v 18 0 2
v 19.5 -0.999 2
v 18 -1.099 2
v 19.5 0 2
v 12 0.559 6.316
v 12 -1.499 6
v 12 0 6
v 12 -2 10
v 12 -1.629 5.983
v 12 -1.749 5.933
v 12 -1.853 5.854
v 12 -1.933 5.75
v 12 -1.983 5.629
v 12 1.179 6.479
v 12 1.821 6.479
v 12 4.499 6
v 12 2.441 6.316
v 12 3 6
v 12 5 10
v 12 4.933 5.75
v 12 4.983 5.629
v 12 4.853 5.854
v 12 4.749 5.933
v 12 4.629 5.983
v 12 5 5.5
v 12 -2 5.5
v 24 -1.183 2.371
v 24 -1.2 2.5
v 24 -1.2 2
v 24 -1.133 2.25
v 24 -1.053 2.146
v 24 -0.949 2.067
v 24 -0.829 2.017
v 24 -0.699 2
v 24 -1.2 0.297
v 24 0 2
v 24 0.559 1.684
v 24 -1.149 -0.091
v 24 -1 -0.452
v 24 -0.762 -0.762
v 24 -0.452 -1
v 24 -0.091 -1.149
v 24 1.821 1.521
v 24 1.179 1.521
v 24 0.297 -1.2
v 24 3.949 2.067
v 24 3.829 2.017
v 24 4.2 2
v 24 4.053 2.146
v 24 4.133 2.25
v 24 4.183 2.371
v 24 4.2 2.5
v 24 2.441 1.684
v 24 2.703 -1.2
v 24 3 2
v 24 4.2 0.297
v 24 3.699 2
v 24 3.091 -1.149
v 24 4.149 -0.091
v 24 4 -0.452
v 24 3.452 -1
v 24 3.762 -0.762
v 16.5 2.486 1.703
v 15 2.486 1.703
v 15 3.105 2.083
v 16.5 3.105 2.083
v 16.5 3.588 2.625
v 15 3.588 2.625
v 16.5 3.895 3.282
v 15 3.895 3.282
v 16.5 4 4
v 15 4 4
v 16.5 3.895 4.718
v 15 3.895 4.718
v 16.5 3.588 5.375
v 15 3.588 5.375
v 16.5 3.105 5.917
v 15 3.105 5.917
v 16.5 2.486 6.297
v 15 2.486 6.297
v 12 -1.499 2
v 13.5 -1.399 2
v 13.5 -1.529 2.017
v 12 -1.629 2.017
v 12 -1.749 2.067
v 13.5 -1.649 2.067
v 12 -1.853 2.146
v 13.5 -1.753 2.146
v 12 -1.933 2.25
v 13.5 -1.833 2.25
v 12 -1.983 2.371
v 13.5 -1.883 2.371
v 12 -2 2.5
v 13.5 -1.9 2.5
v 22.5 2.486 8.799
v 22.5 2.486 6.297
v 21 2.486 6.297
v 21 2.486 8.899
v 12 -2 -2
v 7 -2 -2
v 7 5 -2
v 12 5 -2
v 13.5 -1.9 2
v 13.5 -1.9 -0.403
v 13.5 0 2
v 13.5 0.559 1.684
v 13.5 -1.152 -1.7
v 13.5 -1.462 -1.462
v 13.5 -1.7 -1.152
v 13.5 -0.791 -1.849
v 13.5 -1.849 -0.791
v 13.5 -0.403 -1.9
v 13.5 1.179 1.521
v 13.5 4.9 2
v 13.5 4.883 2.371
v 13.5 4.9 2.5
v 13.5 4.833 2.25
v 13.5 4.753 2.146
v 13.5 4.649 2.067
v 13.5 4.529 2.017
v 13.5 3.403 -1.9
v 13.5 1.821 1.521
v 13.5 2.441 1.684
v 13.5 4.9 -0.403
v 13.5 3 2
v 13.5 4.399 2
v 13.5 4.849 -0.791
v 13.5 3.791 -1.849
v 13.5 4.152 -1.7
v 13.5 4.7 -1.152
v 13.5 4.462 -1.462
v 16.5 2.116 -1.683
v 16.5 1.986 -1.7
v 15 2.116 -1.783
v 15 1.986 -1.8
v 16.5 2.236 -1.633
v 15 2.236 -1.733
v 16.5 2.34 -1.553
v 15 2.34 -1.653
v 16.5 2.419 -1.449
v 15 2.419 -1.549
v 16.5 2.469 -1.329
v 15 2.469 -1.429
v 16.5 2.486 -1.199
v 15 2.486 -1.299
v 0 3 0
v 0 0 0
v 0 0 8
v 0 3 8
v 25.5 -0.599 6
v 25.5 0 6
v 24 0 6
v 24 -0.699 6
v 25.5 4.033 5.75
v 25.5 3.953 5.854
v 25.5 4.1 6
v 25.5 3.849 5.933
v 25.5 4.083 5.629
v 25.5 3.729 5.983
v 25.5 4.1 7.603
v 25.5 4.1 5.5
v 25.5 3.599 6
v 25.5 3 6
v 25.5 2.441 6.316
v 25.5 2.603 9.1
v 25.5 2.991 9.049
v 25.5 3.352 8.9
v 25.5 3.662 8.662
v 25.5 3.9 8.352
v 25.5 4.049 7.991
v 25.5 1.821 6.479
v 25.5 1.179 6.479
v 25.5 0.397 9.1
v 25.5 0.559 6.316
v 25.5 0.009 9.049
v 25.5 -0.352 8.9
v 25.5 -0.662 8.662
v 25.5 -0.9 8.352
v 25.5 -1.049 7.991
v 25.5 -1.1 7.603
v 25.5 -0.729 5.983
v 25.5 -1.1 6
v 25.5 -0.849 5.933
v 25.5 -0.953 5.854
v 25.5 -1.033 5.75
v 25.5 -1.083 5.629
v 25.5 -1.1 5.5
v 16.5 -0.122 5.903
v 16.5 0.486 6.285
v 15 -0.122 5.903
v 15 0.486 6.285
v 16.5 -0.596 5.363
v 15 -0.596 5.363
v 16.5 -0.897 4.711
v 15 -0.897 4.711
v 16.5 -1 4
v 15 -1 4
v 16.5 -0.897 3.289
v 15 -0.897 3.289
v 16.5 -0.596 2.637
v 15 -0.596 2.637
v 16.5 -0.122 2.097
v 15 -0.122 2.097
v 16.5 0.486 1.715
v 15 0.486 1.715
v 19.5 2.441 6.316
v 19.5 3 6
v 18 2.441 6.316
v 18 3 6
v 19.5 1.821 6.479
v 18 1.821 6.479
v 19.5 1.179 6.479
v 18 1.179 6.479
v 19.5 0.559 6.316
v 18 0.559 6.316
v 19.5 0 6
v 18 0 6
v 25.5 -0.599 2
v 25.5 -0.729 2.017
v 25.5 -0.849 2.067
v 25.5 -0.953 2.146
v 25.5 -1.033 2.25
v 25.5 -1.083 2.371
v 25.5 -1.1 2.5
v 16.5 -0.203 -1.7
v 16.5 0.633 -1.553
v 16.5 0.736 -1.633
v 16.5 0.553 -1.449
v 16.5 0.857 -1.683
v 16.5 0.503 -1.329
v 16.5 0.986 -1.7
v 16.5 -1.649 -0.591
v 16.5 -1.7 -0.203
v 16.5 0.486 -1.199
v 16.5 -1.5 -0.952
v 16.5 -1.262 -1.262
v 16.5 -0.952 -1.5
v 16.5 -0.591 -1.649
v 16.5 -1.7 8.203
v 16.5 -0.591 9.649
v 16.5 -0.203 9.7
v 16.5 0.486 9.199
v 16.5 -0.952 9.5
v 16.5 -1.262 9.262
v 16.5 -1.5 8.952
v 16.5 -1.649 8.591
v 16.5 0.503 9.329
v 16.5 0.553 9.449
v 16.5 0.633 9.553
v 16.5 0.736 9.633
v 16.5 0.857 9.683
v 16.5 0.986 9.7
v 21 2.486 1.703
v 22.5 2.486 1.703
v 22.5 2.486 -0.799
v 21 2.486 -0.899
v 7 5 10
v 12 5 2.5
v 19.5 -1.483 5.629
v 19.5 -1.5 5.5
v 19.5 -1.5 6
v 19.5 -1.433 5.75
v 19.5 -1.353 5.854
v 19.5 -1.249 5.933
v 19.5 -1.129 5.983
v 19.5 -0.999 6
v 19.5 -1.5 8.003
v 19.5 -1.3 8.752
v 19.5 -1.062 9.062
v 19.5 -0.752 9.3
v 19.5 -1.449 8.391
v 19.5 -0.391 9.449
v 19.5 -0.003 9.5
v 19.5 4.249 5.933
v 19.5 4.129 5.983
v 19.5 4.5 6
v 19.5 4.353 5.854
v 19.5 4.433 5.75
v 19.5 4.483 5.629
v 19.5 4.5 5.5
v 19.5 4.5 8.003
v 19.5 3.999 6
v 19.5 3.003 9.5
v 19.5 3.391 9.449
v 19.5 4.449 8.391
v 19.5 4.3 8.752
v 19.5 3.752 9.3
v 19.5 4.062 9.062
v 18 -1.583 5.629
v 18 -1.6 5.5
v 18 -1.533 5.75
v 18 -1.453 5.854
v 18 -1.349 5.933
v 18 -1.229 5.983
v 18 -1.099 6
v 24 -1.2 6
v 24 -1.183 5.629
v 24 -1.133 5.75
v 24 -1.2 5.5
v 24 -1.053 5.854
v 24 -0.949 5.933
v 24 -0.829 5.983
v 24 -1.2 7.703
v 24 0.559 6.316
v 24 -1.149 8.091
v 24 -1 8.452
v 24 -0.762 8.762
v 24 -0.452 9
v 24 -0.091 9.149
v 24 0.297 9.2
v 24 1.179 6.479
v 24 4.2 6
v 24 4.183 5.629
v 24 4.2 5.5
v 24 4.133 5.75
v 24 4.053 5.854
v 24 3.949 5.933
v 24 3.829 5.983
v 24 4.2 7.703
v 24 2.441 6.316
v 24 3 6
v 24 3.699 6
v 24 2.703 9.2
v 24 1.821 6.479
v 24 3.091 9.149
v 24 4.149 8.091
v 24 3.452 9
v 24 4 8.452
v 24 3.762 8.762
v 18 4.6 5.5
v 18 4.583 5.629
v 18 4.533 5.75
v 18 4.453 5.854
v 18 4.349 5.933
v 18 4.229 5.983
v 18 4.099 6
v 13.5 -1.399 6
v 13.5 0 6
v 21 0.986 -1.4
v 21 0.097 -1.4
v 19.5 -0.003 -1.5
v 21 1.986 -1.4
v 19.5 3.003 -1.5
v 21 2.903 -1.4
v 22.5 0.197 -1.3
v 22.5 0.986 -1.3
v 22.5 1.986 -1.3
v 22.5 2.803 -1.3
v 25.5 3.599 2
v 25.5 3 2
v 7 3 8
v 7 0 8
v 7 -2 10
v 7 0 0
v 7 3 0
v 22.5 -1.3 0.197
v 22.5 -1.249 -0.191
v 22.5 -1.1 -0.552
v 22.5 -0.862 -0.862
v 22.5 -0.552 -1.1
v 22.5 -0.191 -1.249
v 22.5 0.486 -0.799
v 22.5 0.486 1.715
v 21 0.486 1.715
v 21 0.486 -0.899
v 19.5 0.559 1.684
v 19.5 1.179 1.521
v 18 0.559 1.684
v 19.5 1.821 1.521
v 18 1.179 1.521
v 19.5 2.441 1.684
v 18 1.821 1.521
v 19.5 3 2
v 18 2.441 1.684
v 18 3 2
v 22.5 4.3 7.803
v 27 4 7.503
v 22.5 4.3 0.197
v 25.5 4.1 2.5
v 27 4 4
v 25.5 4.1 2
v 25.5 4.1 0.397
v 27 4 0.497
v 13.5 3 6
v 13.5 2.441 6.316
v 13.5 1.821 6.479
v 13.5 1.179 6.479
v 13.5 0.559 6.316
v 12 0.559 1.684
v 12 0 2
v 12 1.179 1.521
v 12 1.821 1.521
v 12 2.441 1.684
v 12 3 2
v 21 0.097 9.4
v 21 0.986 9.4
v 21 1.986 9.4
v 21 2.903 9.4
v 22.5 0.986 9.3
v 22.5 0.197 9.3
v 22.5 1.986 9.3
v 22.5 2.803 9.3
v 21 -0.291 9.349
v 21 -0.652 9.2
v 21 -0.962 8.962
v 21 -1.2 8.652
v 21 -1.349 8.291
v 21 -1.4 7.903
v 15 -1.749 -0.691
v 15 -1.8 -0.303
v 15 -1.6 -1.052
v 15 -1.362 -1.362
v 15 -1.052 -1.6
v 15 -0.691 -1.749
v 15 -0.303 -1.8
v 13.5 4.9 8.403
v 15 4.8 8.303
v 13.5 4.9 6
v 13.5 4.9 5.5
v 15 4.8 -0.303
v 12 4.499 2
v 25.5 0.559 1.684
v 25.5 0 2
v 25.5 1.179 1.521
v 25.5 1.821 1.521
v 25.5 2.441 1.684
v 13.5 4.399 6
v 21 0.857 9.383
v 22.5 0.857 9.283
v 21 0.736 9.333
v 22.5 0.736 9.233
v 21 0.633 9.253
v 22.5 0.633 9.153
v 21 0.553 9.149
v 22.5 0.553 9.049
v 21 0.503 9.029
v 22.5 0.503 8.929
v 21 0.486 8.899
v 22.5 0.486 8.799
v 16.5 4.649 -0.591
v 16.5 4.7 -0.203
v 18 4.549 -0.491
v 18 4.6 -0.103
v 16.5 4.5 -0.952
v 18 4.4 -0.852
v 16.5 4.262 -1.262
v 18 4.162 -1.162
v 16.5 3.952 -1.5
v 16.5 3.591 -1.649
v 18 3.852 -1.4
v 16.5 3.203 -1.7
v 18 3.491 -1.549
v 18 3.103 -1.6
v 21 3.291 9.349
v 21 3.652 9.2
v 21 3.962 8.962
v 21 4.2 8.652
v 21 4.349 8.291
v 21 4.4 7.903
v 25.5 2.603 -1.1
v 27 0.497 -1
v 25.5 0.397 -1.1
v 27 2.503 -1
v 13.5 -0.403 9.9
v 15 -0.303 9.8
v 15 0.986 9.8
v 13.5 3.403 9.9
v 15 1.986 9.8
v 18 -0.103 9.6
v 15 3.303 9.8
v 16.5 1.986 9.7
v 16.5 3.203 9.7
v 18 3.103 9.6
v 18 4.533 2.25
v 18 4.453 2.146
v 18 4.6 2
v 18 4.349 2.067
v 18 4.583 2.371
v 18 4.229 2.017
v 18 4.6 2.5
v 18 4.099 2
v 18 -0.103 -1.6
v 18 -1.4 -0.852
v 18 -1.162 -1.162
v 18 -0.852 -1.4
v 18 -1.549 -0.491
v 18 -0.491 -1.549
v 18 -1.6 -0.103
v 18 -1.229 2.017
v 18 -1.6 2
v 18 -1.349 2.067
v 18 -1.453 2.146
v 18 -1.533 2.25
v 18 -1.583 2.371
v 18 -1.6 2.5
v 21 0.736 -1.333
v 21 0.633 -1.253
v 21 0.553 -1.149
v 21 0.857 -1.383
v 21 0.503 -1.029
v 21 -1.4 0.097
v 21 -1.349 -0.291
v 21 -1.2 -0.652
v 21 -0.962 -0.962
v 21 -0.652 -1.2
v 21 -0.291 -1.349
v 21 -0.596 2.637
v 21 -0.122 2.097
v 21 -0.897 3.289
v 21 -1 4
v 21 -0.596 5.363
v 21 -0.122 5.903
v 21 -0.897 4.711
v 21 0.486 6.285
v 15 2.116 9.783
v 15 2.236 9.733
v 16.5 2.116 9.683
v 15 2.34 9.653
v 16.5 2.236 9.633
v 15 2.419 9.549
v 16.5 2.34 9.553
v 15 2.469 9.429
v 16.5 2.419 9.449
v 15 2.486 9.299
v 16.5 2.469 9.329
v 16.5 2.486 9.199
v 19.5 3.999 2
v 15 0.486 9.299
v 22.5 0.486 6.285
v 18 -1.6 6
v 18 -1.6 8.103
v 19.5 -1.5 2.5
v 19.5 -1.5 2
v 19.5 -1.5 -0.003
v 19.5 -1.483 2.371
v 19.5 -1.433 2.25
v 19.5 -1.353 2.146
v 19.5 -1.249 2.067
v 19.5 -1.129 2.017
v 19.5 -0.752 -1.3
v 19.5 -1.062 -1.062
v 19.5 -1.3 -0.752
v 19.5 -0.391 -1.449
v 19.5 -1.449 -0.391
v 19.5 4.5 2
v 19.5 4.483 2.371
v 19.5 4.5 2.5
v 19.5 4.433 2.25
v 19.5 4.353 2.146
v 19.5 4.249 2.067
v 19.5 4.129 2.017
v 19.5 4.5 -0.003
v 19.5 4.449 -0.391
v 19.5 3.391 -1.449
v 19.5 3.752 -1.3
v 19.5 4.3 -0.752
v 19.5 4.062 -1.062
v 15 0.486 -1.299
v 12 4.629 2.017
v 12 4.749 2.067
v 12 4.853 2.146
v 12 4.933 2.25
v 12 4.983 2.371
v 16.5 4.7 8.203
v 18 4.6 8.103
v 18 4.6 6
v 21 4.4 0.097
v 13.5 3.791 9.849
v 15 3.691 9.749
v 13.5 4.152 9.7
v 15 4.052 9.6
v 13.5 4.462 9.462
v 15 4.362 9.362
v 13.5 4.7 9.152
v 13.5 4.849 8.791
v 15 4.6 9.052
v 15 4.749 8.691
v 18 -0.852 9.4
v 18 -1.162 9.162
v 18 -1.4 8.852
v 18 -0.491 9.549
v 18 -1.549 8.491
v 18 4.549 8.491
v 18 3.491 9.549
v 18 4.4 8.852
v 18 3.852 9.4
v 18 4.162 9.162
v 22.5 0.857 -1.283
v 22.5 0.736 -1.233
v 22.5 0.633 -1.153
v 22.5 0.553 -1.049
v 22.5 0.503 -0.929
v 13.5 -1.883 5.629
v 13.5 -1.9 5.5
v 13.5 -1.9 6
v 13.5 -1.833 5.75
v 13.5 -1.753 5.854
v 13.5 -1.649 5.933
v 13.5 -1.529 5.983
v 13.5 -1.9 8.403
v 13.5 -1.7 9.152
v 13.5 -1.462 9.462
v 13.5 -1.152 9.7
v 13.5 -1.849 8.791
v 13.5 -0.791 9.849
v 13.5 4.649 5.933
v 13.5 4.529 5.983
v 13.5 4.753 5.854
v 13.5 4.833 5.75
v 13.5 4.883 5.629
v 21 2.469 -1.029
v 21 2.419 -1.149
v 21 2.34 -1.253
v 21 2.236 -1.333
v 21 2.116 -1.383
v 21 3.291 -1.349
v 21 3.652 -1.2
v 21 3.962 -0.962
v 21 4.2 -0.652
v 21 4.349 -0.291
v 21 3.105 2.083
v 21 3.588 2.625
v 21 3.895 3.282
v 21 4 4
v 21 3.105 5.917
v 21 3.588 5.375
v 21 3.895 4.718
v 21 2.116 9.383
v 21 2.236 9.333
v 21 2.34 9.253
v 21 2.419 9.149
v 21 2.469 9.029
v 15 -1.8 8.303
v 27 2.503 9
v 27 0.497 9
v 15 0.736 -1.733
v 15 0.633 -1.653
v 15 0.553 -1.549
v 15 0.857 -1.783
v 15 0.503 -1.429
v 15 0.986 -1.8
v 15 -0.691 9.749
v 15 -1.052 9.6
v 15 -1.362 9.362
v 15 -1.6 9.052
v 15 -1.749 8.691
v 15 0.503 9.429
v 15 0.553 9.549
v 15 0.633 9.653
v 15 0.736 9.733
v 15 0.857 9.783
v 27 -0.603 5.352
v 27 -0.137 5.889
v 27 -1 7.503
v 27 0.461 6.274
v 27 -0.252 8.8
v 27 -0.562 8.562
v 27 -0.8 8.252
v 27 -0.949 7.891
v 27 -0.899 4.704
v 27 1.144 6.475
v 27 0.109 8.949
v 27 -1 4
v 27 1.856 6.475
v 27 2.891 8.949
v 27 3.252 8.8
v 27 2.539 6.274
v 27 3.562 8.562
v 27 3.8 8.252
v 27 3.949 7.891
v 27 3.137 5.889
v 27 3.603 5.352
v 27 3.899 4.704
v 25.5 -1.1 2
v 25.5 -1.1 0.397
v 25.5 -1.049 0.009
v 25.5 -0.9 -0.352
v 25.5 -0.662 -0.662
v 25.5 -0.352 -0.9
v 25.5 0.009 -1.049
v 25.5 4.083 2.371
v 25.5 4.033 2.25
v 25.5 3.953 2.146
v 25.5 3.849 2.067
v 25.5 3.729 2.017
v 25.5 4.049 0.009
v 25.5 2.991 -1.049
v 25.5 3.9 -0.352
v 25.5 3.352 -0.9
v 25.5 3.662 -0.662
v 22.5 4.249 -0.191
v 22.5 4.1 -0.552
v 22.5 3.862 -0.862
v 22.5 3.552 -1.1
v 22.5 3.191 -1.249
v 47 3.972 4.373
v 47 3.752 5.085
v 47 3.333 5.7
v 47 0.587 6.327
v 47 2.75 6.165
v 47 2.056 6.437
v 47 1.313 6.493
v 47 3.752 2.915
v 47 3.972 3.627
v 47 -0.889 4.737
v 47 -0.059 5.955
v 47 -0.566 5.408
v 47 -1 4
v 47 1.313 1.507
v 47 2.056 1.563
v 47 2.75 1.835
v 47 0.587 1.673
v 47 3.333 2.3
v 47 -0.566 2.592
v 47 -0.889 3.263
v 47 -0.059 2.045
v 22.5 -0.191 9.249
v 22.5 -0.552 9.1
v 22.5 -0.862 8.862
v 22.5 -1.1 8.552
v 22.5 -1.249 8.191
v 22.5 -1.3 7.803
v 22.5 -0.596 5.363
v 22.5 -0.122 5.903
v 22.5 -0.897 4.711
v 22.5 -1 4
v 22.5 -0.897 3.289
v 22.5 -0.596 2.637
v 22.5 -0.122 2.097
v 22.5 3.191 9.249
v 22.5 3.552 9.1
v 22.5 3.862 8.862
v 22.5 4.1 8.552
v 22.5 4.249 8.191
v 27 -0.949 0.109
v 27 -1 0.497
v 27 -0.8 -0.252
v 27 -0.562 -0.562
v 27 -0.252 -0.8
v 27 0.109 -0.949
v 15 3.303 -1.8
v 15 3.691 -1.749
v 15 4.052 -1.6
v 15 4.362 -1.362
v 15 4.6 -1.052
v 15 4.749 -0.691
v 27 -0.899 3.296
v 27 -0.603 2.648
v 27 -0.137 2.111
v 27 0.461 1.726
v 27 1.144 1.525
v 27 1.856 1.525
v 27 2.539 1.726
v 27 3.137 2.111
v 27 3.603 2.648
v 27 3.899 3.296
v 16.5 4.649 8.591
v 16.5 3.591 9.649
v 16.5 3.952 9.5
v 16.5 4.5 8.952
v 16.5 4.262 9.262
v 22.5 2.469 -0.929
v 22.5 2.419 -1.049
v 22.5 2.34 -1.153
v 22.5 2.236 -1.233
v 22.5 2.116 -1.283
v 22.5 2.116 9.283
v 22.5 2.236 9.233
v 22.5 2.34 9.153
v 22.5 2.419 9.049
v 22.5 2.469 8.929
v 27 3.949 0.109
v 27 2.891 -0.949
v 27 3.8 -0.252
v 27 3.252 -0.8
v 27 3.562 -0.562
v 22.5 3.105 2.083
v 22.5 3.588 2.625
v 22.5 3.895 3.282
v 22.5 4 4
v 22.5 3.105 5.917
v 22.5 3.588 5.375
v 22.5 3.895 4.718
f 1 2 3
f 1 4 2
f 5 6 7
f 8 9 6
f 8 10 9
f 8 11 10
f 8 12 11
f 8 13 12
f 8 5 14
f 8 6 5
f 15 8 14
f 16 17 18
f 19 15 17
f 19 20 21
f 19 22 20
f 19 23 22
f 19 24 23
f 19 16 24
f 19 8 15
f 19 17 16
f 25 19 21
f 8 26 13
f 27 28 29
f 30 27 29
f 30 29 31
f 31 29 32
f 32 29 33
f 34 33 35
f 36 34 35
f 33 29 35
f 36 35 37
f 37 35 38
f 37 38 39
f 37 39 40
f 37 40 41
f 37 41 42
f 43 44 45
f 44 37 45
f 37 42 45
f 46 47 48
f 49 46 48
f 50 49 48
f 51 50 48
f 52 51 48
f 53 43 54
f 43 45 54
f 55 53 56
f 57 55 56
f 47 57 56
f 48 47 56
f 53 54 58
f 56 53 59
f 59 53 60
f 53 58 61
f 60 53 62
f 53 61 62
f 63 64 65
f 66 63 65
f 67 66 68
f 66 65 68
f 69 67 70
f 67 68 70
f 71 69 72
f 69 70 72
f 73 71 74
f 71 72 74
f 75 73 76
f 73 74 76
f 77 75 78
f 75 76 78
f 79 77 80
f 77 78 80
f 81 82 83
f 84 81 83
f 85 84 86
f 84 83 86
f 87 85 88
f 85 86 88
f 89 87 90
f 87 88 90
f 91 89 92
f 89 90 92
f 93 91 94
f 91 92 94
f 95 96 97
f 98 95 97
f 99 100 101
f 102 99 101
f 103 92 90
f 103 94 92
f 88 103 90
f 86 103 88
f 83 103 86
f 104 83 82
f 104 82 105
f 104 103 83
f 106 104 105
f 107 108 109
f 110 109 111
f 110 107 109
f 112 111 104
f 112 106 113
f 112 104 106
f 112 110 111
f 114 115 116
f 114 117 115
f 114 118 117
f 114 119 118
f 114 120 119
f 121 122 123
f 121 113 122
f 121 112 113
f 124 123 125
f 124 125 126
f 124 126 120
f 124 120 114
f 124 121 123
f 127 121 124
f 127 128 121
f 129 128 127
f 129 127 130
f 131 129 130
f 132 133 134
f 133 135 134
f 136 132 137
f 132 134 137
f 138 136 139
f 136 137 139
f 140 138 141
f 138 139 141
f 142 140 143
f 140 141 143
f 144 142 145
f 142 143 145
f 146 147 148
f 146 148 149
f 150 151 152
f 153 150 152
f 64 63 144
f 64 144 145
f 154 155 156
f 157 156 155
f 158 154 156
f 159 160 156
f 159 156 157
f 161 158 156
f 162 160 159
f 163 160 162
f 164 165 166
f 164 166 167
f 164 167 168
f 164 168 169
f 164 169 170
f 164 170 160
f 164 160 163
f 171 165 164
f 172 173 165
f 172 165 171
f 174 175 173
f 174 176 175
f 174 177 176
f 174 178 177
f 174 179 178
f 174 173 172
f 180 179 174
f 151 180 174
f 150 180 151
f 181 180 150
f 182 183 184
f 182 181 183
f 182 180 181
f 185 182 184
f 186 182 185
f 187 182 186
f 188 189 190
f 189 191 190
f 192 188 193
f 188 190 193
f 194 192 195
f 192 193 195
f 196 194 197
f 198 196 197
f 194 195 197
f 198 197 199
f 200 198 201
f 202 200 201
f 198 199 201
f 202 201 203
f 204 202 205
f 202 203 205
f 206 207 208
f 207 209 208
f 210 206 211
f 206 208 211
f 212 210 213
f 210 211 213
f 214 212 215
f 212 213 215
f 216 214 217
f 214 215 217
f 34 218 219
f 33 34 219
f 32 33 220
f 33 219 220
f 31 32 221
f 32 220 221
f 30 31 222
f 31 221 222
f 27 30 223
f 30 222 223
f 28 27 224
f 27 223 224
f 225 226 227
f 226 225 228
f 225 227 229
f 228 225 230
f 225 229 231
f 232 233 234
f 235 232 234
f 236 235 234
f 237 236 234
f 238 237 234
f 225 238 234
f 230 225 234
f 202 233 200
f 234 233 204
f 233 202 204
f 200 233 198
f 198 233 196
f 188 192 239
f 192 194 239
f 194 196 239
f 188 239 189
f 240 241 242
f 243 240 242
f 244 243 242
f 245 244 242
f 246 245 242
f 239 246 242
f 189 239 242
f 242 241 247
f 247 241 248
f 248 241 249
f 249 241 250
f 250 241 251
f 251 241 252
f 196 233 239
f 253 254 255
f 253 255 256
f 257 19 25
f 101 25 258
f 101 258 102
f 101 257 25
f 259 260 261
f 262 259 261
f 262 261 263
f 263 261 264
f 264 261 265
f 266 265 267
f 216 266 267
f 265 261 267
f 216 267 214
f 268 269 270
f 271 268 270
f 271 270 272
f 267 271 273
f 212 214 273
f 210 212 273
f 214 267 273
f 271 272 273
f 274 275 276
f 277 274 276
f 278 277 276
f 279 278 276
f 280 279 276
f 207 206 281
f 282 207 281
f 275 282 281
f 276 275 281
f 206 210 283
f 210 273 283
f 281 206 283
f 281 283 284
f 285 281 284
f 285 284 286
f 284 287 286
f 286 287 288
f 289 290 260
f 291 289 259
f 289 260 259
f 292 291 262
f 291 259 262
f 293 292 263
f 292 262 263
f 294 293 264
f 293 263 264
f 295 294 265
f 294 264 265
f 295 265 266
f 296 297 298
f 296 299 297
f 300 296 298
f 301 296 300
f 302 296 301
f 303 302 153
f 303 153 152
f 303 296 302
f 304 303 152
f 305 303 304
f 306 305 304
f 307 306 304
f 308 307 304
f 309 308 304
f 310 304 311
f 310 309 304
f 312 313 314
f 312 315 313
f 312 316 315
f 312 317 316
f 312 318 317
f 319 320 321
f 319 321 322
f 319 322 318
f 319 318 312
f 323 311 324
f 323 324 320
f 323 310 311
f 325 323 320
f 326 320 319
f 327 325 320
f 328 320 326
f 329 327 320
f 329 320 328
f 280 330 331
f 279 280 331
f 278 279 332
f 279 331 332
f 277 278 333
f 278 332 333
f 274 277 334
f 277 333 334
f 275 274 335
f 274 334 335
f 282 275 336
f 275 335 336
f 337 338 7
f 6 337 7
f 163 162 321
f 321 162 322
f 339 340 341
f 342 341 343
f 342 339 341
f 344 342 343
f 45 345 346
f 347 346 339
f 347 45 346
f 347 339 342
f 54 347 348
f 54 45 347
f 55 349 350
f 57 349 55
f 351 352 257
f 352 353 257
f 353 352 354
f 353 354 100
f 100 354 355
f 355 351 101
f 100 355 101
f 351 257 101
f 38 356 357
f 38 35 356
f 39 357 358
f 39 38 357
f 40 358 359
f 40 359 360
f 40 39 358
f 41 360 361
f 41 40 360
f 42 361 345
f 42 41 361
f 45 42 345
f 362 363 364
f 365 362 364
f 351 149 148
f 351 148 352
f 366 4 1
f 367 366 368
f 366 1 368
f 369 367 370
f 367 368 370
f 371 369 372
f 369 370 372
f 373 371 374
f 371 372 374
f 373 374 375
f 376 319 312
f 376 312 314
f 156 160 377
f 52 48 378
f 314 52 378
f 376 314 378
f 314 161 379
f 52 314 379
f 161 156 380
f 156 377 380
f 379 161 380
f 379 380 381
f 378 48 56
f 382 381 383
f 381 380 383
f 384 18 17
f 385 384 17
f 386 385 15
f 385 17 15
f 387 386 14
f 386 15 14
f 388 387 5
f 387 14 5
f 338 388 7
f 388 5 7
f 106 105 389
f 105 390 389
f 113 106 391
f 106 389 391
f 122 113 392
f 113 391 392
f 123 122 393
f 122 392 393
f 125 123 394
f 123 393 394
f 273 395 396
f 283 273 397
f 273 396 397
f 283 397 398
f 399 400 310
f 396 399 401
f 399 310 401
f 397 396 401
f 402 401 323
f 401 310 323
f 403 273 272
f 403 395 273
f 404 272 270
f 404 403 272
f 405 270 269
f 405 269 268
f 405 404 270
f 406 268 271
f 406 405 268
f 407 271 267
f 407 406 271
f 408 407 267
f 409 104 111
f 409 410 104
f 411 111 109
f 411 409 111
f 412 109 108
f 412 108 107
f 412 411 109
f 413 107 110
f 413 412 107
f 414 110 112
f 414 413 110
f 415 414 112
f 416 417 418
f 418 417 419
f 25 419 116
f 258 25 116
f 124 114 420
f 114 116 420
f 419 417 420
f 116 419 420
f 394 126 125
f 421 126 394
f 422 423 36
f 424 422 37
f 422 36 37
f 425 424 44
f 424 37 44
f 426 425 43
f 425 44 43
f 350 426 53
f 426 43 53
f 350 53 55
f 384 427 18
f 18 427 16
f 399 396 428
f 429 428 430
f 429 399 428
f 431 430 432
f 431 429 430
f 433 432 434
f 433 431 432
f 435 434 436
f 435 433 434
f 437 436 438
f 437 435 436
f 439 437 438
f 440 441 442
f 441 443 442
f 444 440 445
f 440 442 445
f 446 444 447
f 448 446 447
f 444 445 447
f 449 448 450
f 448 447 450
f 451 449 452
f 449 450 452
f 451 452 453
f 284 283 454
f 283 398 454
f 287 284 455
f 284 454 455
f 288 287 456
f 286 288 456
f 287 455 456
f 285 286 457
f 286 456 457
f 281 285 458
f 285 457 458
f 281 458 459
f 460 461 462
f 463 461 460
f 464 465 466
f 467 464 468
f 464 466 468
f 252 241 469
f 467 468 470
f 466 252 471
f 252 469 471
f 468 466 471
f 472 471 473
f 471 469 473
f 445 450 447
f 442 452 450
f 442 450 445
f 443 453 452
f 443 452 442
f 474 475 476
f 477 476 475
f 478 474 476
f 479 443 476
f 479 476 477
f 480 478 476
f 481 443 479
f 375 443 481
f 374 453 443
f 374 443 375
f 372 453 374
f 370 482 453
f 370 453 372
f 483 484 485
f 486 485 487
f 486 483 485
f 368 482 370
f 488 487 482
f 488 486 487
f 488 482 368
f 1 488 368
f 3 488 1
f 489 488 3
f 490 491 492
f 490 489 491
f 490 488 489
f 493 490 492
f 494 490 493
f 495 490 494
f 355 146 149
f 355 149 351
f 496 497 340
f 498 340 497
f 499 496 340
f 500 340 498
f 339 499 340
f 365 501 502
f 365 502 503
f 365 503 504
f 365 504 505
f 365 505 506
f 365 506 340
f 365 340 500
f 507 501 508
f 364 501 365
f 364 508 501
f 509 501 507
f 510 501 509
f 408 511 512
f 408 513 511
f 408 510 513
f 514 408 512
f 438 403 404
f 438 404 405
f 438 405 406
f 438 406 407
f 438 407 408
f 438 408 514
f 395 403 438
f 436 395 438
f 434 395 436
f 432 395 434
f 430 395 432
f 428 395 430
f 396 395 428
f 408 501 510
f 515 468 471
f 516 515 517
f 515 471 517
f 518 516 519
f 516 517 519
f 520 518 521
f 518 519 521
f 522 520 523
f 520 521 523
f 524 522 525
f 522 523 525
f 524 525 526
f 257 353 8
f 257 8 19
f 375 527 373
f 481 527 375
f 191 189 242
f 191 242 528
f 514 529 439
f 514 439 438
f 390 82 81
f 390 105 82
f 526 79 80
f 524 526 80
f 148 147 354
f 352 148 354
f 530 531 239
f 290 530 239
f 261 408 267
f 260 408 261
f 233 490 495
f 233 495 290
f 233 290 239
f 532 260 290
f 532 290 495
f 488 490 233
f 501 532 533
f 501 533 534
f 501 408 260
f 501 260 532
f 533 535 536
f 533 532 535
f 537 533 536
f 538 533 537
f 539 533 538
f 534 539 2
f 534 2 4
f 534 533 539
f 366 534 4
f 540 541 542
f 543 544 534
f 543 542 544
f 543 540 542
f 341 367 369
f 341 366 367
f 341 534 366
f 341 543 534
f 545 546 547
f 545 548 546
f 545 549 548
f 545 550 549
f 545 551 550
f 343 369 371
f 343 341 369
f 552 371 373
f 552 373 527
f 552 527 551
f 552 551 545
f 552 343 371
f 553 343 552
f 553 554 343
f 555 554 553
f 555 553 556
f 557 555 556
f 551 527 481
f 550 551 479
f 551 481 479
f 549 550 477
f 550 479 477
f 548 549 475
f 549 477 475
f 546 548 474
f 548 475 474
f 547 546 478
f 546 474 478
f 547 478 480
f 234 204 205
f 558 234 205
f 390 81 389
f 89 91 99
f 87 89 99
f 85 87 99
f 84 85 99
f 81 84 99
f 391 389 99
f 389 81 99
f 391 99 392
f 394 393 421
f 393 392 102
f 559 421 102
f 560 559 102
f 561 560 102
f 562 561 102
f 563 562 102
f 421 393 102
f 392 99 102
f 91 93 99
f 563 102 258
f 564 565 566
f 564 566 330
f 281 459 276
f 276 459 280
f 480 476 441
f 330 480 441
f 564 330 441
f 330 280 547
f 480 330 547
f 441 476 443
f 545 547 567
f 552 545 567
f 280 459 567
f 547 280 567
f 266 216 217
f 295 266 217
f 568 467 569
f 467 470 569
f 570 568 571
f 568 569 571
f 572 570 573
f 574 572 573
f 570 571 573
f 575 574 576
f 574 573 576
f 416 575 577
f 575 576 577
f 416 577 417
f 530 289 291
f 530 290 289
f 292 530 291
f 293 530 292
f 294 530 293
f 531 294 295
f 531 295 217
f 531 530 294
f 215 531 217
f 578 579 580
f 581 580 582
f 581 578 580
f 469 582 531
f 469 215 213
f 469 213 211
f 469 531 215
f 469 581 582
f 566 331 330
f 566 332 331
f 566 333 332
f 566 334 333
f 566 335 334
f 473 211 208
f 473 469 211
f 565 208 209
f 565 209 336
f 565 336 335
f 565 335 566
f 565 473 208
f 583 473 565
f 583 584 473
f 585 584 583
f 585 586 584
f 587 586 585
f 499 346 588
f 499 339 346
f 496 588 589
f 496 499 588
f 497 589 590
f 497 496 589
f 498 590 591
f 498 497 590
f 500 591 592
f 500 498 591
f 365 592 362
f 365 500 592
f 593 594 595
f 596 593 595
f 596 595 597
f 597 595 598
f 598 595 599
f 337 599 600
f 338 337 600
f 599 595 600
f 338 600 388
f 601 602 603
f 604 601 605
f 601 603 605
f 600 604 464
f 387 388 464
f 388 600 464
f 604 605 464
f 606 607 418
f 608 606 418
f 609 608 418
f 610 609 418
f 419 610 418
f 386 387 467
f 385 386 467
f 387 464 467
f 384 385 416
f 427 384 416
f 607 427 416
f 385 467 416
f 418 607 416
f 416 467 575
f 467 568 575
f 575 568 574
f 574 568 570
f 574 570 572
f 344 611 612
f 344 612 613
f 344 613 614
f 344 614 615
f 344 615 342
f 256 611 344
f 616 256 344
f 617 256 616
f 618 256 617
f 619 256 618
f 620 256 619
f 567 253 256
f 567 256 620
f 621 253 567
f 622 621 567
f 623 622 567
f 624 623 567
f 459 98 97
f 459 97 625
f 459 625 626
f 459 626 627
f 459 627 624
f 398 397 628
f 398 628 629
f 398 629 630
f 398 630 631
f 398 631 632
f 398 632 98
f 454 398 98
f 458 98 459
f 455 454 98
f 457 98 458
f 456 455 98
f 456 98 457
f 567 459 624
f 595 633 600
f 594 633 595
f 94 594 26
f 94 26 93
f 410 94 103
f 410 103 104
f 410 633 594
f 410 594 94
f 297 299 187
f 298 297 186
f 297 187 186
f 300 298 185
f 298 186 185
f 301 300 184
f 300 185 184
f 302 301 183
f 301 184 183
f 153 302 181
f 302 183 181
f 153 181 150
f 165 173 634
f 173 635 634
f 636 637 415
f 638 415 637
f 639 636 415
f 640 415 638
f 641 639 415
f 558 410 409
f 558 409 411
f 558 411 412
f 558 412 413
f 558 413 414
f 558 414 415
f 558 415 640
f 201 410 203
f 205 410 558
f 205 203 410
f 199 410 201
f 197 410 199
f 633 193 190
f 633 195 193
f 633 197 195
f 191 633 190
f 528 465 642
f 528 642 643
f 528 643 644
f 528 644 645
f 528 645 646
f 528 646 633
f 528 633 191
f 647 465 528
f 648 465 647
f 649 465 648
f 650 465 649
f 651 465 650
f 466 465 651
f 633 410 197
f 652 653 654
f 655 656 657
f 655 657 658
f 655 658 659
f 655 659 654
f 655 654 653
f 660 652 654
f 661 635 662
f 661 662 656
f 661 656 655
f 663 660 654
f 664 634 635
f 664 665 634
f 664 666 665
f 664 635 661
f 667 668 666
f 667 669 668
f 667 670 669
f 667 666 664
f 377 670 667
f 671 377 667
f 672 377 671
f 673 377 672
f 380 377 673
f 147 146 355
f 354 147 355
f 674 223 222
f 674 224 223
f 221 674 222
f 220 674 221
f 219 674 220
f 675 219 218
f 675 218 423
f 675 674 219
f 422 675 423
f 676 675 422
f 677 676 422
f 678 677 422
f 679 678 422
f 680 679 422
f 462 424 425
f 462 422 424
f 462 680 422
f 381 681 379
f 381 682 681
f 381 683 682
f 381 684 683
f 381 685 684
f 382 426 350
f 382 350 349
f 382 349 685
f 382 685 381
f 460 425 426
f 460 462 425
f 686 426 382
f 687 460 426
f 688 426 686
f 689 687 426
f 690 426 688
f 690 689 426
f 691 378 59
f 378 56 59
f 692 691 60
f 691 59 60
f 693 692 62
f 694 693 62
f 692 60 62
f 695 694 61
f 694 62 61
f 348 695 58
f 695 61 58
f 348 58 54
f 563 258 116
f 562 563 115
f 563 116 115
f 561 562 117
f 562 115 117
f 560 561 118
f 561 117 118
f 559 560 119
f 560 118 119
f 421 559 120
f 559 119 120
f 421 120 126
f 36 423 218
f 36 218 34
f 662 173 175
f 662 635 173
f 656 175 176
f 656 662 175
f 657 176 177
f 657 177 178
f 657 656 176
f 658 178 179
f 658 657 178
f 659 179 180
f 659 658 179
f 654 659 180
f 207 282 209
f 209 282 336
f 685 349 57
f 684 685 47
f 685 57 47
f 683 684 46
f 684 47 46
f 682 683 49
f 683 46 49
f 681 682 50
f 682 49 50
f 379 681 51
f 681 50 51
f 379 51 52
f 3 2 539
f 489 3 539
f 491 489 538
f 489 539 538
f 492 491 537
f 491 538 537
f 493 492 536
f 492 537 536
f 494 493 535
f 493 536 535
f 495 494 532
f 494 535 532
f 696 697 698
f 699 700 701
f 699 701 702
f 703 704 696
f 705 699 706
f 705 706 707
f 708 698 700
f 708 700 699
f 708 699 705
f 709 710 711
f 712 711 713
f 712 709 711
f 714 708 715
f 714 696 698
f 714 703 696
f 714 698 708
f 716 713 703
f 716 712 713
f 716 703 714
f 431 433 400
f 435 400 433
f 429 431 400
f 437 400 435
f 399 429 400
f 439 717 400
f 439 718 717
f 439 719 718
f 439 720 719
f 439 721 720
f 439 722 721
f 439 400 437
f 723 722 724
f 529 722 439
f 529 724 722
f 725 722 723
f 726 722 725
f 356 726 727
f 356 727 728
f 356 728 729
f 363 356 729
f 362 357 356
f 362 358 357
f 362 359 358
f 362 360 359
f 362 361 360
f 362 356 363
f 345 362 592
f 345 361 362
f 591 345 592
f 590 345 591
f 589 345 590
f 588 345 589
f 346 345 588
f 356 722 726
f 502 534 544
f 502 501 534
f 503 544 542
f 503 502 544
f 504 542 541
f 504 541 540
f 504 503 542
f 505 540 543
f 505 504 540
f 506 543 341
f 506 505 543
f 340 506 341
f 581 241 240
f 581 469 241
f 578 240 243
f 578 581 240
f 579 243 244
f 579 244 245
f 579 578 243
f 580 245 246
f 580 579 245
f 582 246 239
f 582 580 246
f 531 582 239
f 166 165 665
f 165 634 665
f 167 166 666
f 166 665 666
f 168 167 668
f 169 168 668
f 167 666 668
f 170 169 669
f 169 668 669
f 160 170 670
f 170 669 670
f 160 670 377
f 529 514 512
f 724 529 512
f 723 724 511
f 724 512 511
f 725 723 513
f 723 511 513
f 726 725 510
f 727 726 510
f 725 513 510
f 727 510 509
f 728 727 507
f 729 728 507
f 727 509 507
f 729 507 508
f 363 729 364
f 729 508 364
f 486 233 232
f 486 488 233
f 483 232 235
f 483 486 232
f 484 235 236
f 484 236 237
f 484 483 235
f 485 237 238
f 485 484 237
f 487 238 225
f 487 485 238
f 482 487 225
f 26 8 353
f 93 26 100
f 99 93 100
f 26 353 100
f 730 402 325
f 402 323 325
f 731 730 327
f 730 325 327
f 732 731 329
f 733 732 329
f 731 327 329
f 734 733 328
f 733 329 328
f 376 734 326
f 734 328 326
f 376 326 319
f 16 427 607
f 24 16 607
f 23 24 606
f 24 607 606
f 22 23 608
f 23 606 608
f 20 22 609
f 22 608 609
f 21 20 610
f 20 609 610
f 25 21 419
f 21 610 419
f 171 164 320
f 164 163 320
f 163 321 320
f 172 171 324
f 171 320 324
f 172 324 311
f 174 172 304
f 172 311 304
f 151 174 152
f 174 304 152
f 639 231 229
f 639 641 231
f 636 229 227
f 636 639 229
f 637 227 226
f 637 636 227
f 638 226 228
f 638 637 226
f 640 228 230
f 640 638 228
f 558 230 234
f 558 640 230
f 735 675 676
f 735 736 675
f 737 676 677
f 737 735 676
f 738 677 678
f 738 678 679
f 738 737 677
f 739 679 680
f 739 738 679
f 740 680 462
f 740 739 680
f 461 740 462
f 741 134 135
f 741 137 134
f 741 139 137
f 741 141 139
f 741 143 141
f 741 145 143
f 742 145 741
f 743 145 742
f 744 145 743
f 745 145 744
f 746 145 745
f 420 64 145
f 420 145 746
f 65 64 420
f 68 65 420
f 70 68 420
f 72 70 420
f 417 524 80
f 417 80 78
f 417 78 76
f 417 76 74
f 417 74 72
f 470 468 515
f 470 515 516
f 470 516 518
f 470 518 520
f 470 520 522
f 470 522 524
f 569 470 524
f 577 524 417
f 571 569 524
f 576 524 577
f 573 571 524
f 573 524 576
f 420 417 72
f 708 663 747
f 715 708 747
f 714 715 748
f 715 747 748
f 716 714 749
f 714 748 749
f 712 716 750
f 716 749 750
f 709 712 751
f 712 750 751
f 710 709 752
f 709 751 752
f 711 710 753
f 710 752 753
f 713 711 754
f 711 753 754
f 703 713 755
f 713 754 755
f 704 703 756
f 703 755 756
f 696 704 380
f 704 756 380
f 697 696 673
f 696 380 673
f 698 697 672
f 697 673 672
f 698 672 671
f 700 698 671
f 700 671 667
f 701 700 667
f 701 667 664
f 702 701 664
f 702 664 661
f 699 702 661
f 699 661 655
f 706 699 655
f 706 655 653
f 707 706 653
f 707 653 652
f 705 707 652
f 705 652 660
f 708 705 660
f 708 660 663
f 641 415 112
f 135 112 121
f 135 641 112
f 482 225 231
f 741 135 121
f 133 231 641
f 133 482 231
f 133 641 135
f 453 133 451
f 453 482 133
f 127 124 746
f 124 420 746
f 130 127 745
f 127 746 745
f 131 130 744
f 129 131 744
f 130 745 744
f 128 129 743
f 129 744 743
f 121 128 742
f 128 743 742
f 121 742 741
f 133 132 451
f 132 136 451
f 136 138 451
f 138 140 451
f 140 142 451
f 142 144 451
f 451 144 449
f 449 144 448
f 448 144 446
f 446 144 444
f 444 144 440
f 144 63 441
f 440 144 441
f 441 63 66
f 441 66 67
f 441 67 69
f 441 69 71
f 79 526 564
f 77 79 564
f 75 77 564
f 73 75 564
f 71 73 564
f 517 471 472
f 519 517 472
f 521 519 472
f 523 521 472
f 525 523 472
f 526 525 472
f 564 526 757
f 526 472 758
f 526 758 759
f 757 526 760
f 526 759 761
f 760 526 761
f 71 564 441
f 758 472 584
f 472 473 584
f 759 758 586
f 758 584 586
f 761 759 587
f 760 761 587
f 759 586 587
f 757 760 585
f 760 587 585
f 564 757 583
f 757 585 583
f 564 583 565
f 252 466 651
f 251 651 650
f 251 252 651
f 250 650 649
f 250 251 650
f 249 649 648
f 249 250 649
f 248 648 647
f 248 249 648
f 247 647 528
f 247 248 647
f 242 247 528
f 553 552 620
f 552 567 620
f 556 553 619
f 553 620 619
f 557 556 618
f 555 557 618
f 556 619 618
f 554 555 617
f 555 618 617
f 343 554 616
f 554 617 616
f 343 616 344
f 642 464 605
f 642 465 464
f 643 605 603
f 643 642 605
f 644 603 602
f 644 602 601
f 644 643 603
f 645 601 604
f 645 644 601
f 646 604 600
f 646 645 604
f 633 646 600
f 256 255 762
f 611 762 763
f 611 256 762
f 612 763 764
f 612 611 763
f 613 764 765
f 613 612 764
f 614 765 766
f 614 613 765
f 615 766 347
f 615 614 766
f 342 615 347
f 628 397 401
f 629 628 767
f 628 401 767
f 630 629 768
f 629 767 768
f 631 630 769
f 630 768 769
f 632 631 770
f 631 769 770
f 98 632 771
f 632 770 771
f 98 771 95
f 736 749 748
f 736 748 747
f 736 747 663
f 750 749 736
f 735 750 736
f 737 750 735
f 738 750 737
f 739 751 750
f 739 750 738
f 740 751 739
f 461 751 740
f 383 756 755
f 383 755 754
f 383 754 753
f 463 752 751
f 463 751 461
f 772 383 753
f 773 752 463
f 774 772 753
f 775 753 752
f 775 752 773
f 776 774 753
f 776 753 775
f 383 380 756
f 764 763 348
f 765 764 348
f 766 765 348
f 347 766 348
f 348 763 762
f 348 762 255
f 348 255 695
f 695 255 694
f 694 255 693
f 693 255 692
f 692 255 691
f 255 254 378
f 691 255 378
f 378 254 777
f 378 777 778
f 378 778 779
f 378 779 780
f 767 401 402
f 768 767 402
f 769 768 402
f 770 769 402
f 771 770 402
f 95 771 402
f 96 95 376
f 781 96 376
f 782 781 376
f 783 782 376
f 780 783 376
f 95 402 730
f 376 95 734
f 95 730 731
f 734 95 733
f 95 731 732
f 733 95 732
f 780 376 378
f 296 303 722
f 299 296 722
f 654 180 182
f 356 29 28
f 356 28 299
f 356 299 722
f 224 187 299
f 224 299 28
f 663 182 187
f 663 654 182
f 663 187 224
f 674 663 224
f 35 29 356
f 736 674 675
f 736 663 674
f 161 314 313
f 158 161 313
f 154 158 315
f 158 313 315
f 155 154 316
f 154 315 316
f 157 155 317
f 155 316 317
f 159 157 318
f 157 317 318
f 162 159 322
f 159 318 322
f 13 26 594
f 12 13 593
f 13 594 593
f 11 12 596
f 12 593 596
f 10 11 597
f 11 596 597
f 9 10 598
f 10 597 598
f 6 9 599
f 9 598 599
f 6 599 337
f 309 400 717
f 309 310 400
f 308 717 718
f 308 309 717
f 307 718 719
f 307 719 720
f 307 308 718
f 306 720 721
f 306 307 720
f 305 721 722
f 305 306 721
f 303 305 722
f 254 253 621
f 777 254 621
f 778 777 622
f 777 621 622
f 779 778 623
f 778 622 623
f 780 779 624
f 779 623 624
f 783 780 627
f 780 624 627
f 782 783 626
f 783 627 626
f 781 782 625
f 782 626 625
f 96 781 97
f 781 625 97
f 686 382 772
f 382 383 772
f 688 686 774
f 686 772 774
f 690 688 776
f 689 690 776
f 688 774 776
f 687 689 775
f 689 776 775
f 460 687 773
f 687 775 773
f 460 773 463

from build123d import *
from OCP.BRepFilletAPI import BRepFilletAPI_MakeChamfer

# Parameters (mm, degrees)
SKETCH_1_W           = 7
SKETCH_1_H           = 3
EXTRUDE_1_DEPTH      = 8
SKETCH_2_W           = 12
SKETCH_2_H           = 7
EXTRUDE_2_DEPTH      = 20
CHAMFER_1_SIZE       = 15
CHAMFER_1_SIZE2      = 1
SKETCH_4_W           = 1.5
SKETCH_4_H           = 2.5
SKETCH_4_H_2         = 2.51354888
SKETCH_4_H_3         = 2.48645112
CUT_EXTRUDE_1_DEPTH  = 4
FILLET_1_R           = 1.5
SKETCH_9_W           = 1.5
SKETCH_9_H           = 2
CUT_EXTRUDE_3_DEPTH  = 4
SKETCH_10_W          = 1.5
SKETCH_10_H          = 4
CUT_EXTRUDE_4_DEPTH  = 2.5
EXTRUDE_3_DEPTH      = 20
EXTRUDE_3_DEPTH_BACK = 20
SKETCH_11_R          = 2.5
FILLET_2_R           = 0.5
FILLET_3_R           = 0.5
FILLET_4_R           = 0.5
FILLET_5_R           = 0.5


with BuildPart() as part:
    # Эскиз1 → Бобышка-Вытянуть1 (new body)
    with BuildSketch(Plane.XY):
        with Locations((3.5, 1.5)):
            Rectangle(SKETCH_1_W, SKETCH_1_H)
    extrude(amount=EXTRUDE_1_DEPTH)

    # Эскиз2 → Бобышка-Вытянуть2 (add)
    with BuildSketch(Plane(origin=(7, 0, 0), x_dir=(0, 0, -1), z_dir=(1, 0, 0))):
        with Locations((-4, 1.5)):
            Rectangle(SKETCH_2_W, SKETCH_2_H)
    extrude(amount=EXTRUDE_2_DEPTH)

    # Фаска1: one chamfer whose edges measure the first distance from different faces: ONE call of the kernel's chamfer builder (chamfer() names one face for all edges)
    chamfer_1_edges_1 = [part.edges().sort_by_distance(p)[0] for p in [
        (27, 1.5, 10),
    ]]
    chamfer_1_side_1 = [part.faces().sort_by_distance(p)[0] for p in [
        (17, 1.5, 10),
    ]]
    chamfer_1_edges_2 = [part.edges().sort_by_distance(p)[0] for p in [
        (27, -2, 4),
    ]]
    chamfer_1_side_2 = [part.faces().sort_by_distance(p)[0] for p in [
        (17, -2, 4),
    ]]
    chamfer_1_edges_3 = [part.edges().sort_by_distance(p)[0] for p in [
        (27, 1.5, -2),
    ]]
    chamfer_1_side_3 = [part.faces().sort_by_distance(p)[0] for p in [
        (17, 1.5, -2),
    ]]
    chamfer_1_edges_4 = [part.edges().sort_by_distance(p)[0] for p in [
        (27, 5, 4),
    ]]
    chamfer_1_side_4 = [part.faces().sort_by_distance(p)[0] for p in [
        (17, 5, 4),
    ]]
    chamfer_1 = BRepFilletAPI_MakeChamfer(part.part.solid().wrapped)
    for e in chamfer_1_edges_1:
        chamfer_1.Add(CHAMFER_1_SIZE, CHAMFER_1_SIZE2, e.wrapped, chamfer_1_side_1[0].wrapped)  # the first distance lies on this face
    for e in chamfer_1_edges_2:
        chamfer_1.Add(CHAMFER_1_SIZE, CHAMFER_1_SIZE2, e.wrapped, chamfer_1_side_2[0].wrapped)  # the first distance lies on this face
    for e in chamfer_1_edges_3:
        chamfer_1.Add(CHAMFER_1_SIZE, CHAMFER_1_SIZE2, e.wrapped, chamfer_1_side_3[0].wrapped)  # the first distance lies on this face
    for e in chamfer_1_edges_4:
        chamfer_1.Add(CHAMFER_1_SIZE, CHAMFER_1_SIZE2, e.wrapped, chamfer_1_side_4[0].wrapped)  # the first distance lies on this face
    add(Compound.cast(chamfer_1.Shape()), mode=Mode.REPLACE)

    # Эскиз4 → Вырез-Вытянуть1 (cut)
    with BuildSketch(Plane(origin=(0, 0, -2), x_dir=(-1, 0, 0), z_dir=(0, 0, -1))):
        with Locations((-24.75, 3.73645112)):
            Rectangle(SKETCH_4_W, SKETCH_4_H)
        with Locations((-21.75, 3.73645112)):
            Rectangle(SKETCH_4_W, SKETCH_4_H)
        with Locations((-18.75, 3.73645112)):
            Rectangle(SKETCH_4_W, SKETCH_4_H)
        with Locations((-15.75, 3.73645112)):
            Rectangle(SKETCH_4_W, SKETCH_4_H)
        with Locations((-12.75, 3.74322556)):
            Rectangle(SKETCH_4_W, SKETCH_4_H_2)
        with Locations((-21.75, -0.76354888)):
            Rectangle(SKETCH_4_W, SKETCH_4_H)
        with Locations((-18.75, -0.76354888)):
            Rectangle(SKETCH_4_W, SKETCH_4_H)
        with Locations((-15.75, -0.76354888)):
            Rectangle(SKETCH_4_W, SKETCH_4_H)
        with Locations((-12.75, -0.75677444)):
            Rectangle(SKETCH_4_W, SKETCH_4_H_3)
        with Locations((-24.75, -0.76354888)):
            Rectangle(SKETCH_4_W, SKETCH_4_H)
    cut_extrude_1 = extrude(amount=-CUT_EXTRUDE_1_DEPTH, mode=Mode.SUBTRACT)

    # Зеркальное отражение1: Вырез-Вытянуть1 across plane
    add(cut_extrude_1.mirror(Plane.XY.offset(4)), mode=Mode.SUBTRACT)

    # Скругление1
    fillet_1_edges = [part.edges().sort_by_distance(p)[0] for p in [
        (20.25, -1.45, -1.45),
        (17.25, -1.65, -1.65),
        (14.25, -1.85, -1.85),
        (23.25, -1.25, -1.25),
        (26.25, 4.05, 9.05),
        (23.25, 4.25, 9.25),
        (20.25, 4.45, 9.45),
        (17.25, 4.65, 9.65),
        (14.25, 4.85, 9.85),
        (23.25, -1.25, 9.25),
        (20.25, -1.45, 9.45),
        (17.25, -1.65, 9.65),
        (26.25, -1.05, -1.05),
        (14.25, -1.85, 9.85),
        (26.25, 4.05, -1.05),
        (26.25, -1.05, 9.05),
        (23.25, 4.25, -1.25),
        (20.25, 4.45, -1.45),
        (17.25, 4.65, -1.65),
        (14.25, 4.85, -1.85),
    ]]
    fillet(fillet_1_edges, radius=FILLET_1_R)

    # Эскиз9 → Вырез-Вытянуть3 (cut)
    with BuildSketch(Plane.XY.offset(10)):
        with Locations((12.75, 1.48645112)):
            Rectangle(SKETCH_9_W, SKETCH_9_H)
        with Locations((18.75, 1.48645112)):
            Rectangle(SKETCH_9_W, SKETCH_9_H)
        with Locations((24.75, 1.48645112)):
            Rectangle(SKETCH_9_W, SKETCH_9_H)
    cut_extrude_3 = extrude(amount=-CUT_EXTRUDE_3_DEPTH, mode=Mode.SUBTRACT)

    # Зеркальное отражение2: Вырез-Вытянуть3 across plane
    add(cut_extrude_3.mirror(Plane.XY.offset(4)), mode=Mode.SUBTRACT)

    # Эскиз10 → Вырез-Вытянуть4 (cut)
    with BuildSketch(Plane(origin=(0, 5, 0), x_dir=(1, 0, 0), z_dir=(0, 1, 0))):
        with Locations((15.75, -4)):
            Rectangle(SKETCH_10_W, SKETCH_10_H)
        with Locations((21.75, -4)):
            Rectangle(SKETCH_10_W, SKETCH_10_H)
    cut_extrude_4 = extrude(amount=-CUT_EXTRUDE_4_DEPTH, mode=Mode.SUBTRACT)

    # Зеркальное отражение3: Вырез-Вытянуть4 across plane
    add(cut_extrude_4.mirror(Plane.ZX.offset(1.5)), mode=Mode.SUBTRACT)

    # Эскиз11 → Бобышка-Вытянуть3 (add, two sides: drawn at the far end of the back side and taken through both)
    with BuildSketch(Plane(origin=(27, 0, 0), x_dir=(0, 0, -1), z_dir=(1, 0, 0)).offset(-EXTRUDE_3_DEPTH_BACK)):
        with Locations(Location((-4, 1.5, 0), (0, 0, 270))):
            Circle(SKETCH_11_R)
    extrude(amount=EXTRUDE_3_DEPTH + EXTRUDE_3_DEPTH_BACK)

    # Скругление2
    # the kernel refuses this fillet: 0.5 mm, written as the material it takes off along each edge
    with BuildSketch(Plane(origin=(20.747231447, -1.416851237, 2), x_dir=(-0.06651901052377394, 0.997785157856609, 0), z_dir=(-0.9977851578566089, -0.06651901052377394, 0))) as fillet_2_piece_1_section:
        with BuildLine():
            CenterArc((FILLET_2_R, -FILLET_2_R), FILLET_2_R, 90, 90)
            Line((0, -FILLET_2_R), (0, 0))
            Line((0, 0), (FILLET_2_R, 0))
        make_face()
    fillet_2_piece_1 = extrude(amount=4.003329638, mode=Mode.PRIVATE)
    fillet_2_piece_1 = split(fillet_2_piece_1, bisect_by=Plane(origin=(19.5, -1.436551172, 2.113197557), z_dir=(-1, 0, 0)), keep=Keep.TOP, mode=Mode.PRIVATE)
    fillet_2_piece_1 = split(fillet_2_piece_1, bisect_by=Plane(origin=(18, -1.436551172, 2.113197557), z_dir=(1, 0, 0)), keep=Keep.TOP, mode=Mode.PRIVATE)
    add(fillet_2_piece_1, mode=Mode.SUBTRACT)
    with BuildSketch(Plane(origin=(14.747231447, -1.816851237, 2), x_dir=(0, 0, 1), z_dir=(-0.9977851578566089, -0.06651901052377394, 0))) as fillet_2_piece_2_section:
        with BuildLine():
            CenterArc((FILLET_2_R, FILLET_2_R), FILLET_2_R, 180, 90)
            Line((0, FILLET_2_R), (0, 0))
            Line((0, 0), (FILLET_2_R, 0))
        make_face()
    fillet_2_piece_2 = extrude(amount=4.003329638, mode=Mode.PRIVATE)
    fillet_2_piece_2 = split(fillet_2_piece_2, bisect_by=Plane(origin=(12, -1.836551172, 2.113197557), z_dir=(1, 0, 0)), keep=Keep.TOP, mode=Mode.PRIVATE)
    fillet_2_piece_2 = split(fillet_2_piece_2, bisect_by=Plane(origin=(13.5, -1.836551172, 2.113197557), z_dir=(-1, 0, 0)), keep=Keep.TOP, mode=Mode.PRIVATE)
    add(fillet_2_piece_2, mode=Mode.SUBTRACT)
    with BuildSketch(Plane(origin=(26.747231447, -1.016851237, 2), x_dir=(0, 0, 1), z_dir=(-0.9977851578566089, -0.06651901052377394, 0))) as fillet_2_piece_3_section:
        with BuildLine():
            CenterArc((FILLET_2_R, FILLET_2_R), FILLET_2_R, 180, 90)
            Line((0, FILLET_2_R), (0, 0))
            Line((0, 0), (FILLET_2_R, 0))
        make_face()
    fillet_2_piece_3 = extrude(amount=4.003329638, mode=Mode.PRIVATE)
    fillet_2_piece_3 = split(fillet_2_piece_3, bisect_by=Plane(origin=(25.5, -1.036551172, 2.113197557), z_dir=(-1, 0, 0)), keep=Keep.TOP, mode=Mode.PRIVATE)
    fillet_2_piece_3 = split(fillet_2_piece_3, bisect_by=Plane(origin=(24, -1.036551172, 2.113197557), z_dir=(1, 0, 0)), keep=Keep.TOP, mode=Mode.PRIVATE)
    add(fillet_2_piece_3, mode=Mode.SUBTRACT)
    with BuildSketch(Plane(origin=(20.747231447, -1.416851237, 6), x_dir=(0, 0, -1), z_dir=(-0.9977851578566089, -0.06651901052377394, 0))) as fillet_2_piece_4_section:
        with BuildLine():
            CenterArc((FILLET_2_R, -FILLET_2_R), FILLET_2_R, 90, 90)
            Line((0, -FILLET_2_R), (0, 0))
            Line((0, 0), (FILLET_2_R, 0))
        make_face()
    fillet_2_piece_4 = extrude(amount=4.003329638, mode=Mode.PRIVATE)
    fillet_2_piece_4 = split(fillet_2_piece_4, bisect_by=Plane(origin=(18, -1.436551172, 5.886802443), z_dir=(1, 0, 0)), keep=Keep.TOP, mode=Mode.PRIVATE)
    fillet_2_piece_4 = split(fillet_2_piece_4, bisect_by=Plane(origin=(19.5, -1.436551172, 5.886802443), z_dir=(-1, 0, 0)), keep=Keep.TOP, mode=Mode.PRIVATE)
    add(fillet_2_piece_4, mode=Mode.SUBTRACT)
    with BuildSketch(Plane(origin=(14.747231447, -1.816851237, 6), x_dir=(0, 0, -1), z_dir=(-0.9977851578566089, -0.06651901052377394, 0))) as fillet_2_piece_5_section:
        with BuildLine():
            CenterArc((FILLET_2_R, -FILLET_2_R), FILLET_2_R, 90, 90)
            Line((0, -FILLET_2_R), (0, 0))
            Line((0, 0), (FILLET_2_R, 0))
        make_face()
    fillet_2_piece_5 = extrude(amount=4.003329638, mode=Mode.PRIVATE)
    fillet_2_piece_5 = split(fillet_2_piece_5, bisect_by=Plane(origin=(12, -1.836551172, 5.886802443), z_dir=(1, 0, 0)), keep=Keep.TOP, mode=Mode.PRIVATE)
    fillet_2_piece_5 = split(fillet_2_piece_5, bisect_by=Plane(origin=(13.5, -1.836551172, 5.886802443), z_dir=(-1, 0, 0)), keep=Keep.TOP, mode=Mode.PRIVATE)
    add(fillet_2_piece_5, mode=Mode.SUBTRACT)
    with BuildSketch(Plane(origin=(26.747231447, -1.016851237, 6), x_dir=(0, 0, -1), z_dir=(-0.9977851578566089, -0.06651901052377394, 0))) as fillet_2_piece_6_section:
        with BuildLine():
            CenterArc((FILLET_2_R, -FILLET_2_R), FILLET_2_R, 90, 90)
            Line((0, -FILLET_2_R), (0, 0))
            Line((0, 0), (FILLET_2_R, 0))
        make_face()
    fillet_2_piece_6 = extrude(amount=4.003329638, mode=Mode.PRIVATE)
    fillet_2_piece_6 = split(fillet_2_piece_6, bisect_by=Plane(origin=(24, -1.036551172, 5.886802443), z_dir=(1, 0, 0)), keep=Keep.TOP, mode=Mode.PRIVATE)
    fillet_2_piece_6 = split(fillet_2_piece_6, bisect_by=Plane(origin=(25.5, -1.036551172, 5.886802443), z_dir=(-1, 0, 0)), keep=Keep.TOP, mode=Mode.PRIVATE)
    add(fillet_2_piece_6, mode=Mode.SUBTRACT)

    # Скругление3
    fillet_3_edges = [part.edges().sort_by_distance(p)[0] for p in [
        (21.75, 2.48645112, 9.35),
        (15.75, 2.48645112, 9.75),
        (21.75, 0.48645112, 9.35),
        (15.75, 0.48645112, 9.75),
    ]]
    fillet(fillet_3_edges, radius=FILLET_3_R)

    # Скругление4
    # the kernel refuses this fillet: 0.5 mm, written as the material it takes off along each edge
    with BuildSketch(Plane(origin=(14.747231447, 4.816851237, 2), x_dir=(0, 0, 1), z_dir=(-0.9977851578566089, 0.06651901052377394, 0))) as fillet_4_piece_1_section:
        with BuildLine():
            CenterArc((FILLET_4_R, -FILLET_4_R), FILLET_4_R, 90, 90)
            Line((0, -FILLET_4_R), (0, 0))
            Line((0, 0), (FILLET_4_R, 0))
        make_face()
    fillet_4_piece_1 = extrude(amount=4.003329638, mode=Mode.PRIVATE)
    fillet_4_piece_1 = split(fillet_4_piece_1, bisect_by=Plane(origin=(12, 4.836551172, 2.113197557), z_dir=(1, 0, 0)), keep=Keep.TOP, mode=Mode.PRIVATE)
    fillet_4_piece_1 = split(fillet_4_piece_1, bisect_by=Plane(origin=(13.5, 4.836551172, 2.113197557), z_dir=(-1, 0, 0)), keep=Keep.TOP, mode=Mode.PRIVATE)
    add(fillet_4_piece_1, mode=Mode.SUBTRACT)
    with BuildSketch(Plane(origin=(22.752768553, 4.283148763, 6), x_dir=(0, 0, -1), z_dir=(0.9977851578566089, -0.06651901052377394, 0))) as fillet_4_piece_2_section:
        with BuildLine():
            CenterArc((FILLET_4_R, -FILLET_4_R), FILLET_4_R, 90, 90)
            Line((0, -FILLET_4_R), (0, 0))
            Line((0, 0), (FILLET_4_R, 0))
        make_face()
    fillet_4_piece_2 = extrude(amount=4.003329638, mode=Mode.PRIVATE)
    fillet_4_piece_2 = split(fillet_4_piece_2, bisect_by=Plane(origin=(25.5, 4.036551172, 5.886802443), z_dir=(-1, 0, 0)), keep=Keep.TOP, mode=Mode.PRIVATE)
    fillet_4_piece_2 = split(fillet_4_piece_2, bisect_by=Plane(origin=(24, 4.036551172, 5.886802443), z_dir=(1, 0, 0)), keep=Keep.TOP, mode=Mode.PRIVATE)
    add(fillet_4_piece_2, mode=Mode.SUBTRACT)
    with BuildSketch(Plane(origin=(16.752768553, 4.683148763, 6), x_dir=(-0.06651901052377394, -0.997785157856609, 0), z_dir=(0.9977851578566089, -0.06651901052377394, 0))) as fillet_4_piece_3_section:
        with BuildLine():
            CenterArc((FILLET_4_R, FILLET_4_R), FILLET_4_R, 180, 90)
            Line((0, FILLET_4_R), (0, 0))
            Line((0, 0), (FILLET_4_R, 0))
        make_face()
    fillet_4_piece_3 = extrude(amount=4.003329638, mode=Mode.PRIVATE)
    fillet_4_piece_3 = split(fillet_4_piece_3, bisect_by=Plane(origin=(18, 4.436551172, 5.886802443), z_dir=(1, 0, 0)), keep=Keep.TOP, mode=Mode.PRIVATE)
    fillet_4_piece_3 = split(fillet_4_piece_3, bisect_by=Plane(origin=(19.5, 4.436551172, 5.886802443), z_dir=(-1, 0, 0)), keep=Keep.TOP, mode=Mode.PRIVATE)
    add(fillet_4_piece_3, mode=Mode.SUBTRACT)
    with BuildSketch(Plane(origin=(14.747231447, 4.816851237, 6), x_dir=(0, 0, -1), z_dir=(-0.9977851578566089, 0.06651901052377394, 0))) as fillet_4_piece_4_section:
        with BuildLine():
            CenterArc((FILLET_4_R, FILLET_4_R), FILLET_4_R, 180, 90)
            Line((0, FILLET_4_R), (0, 0))
            Line((0, 0), (FILLET_4_R, 0))
        make_face()
    fillet_4_piece_4 = extrude(amount=4.003329638, mode=Mode.PRIVATE)
    fillet_4_piece_4 = split(fillet_4_piece_4, bisect_by=Plane(origin=(13.5, 4.836551172, 5.886802443), z_dir=(-1, 0, 0)), keep=Keep.TOP, mode=Mode.PRIVATE)
    fillet_4_piece_4 = split(fillet_4_piece_4, bisect_by=Plane(origin=(12, 4.836551172, 5.886802443), z_dir=(1, 0, 0)), keep=Keep.TOP, mode=Mode.PRIVATE)
    add(fillet_4_piece_4, mode=Mode.SUBTRACT)
    with BuildSketch(Plane(origin=(22.752768553, 4.283148763, 2), x_dir=(0, 0, 1), z_dir=(0.9977851578566089, -0.06651901052377394, 0))) as fillet_4_piece_5_section:
        with BuildLine():
            CenterArc((FILLET_4_R, FILLET_4_R), FILLET_4_R, 180, 90)
            Line((0, FILLET_4_R), (0, 0))
            Line((0, 0), (FILLET_4_R, 0))
        make_face()
    fillet_4_piece_5 = extrude(amount=4.003329638, mode=Mode.PRIVATE)
    fillet_4_piece_5 = split(fillet_4_piece_5, bisect_by=Plane(origin=(24, 4.036551172, 2.113197557), z_dir=(1, 0, 0)), keep=Keep.TOP, mode=Mode.PRIVATE)
    fillet_4_piece_5 = split(fillet_4_piece_5, bisect_by=Plane(origin=(25.5, 4.036551172, 2.113197557), z_dir=(-1, 0, 0)), keep=Keep.TOP, mode=Mode.PRIVATE)
    add(fillet_4_piece_5, mode=Mode.SUBTRACT)
    with BuildSketch(Plane(origin=(16.752768553, 4.683148763, 2), x_dir=(0, 0, 1), z_dir=(0.9977851578566089, -0.06651901052377394, 0))) as fillet_4_piece_6_section:
        with BuildLine():
            CenterArc((FILLET_4_R, FILLET_4_R), FILLET_4_R, 180, 90)
            Line((0, FILLET_4_R), (0, 0))
            Line((0, 0), (FILLET_4_R, 0))
        make_face()
    fillet_4_piece_6 = extrude(amount=4.003329638, mode=Mode.PRIVATE)
    fillet_4_piece_6 = split(fillet_4_piece_6, bisect_by=Plane(origin=(19.5, 4.436551172, 2.113197557), z_dir=(-1, 0, 0)), keep=Keep.TOP, mode=Mode.PRIVATE)
    fillet_4_piece_6 = split(fillet_4_piece_6, bisect_by=Plane(origin=(18, 4.436551172, 2.113197557), z_dir=(1, 0, 0)), keep=Keep.TOP, mode=Mode.PRIVATE)
    add(fillet_4_piece_6, mode=Mode.SUBTRACT)

    # Скругление5
    fillet_5_edges = [part.edges().sort_by_distance(p)[0] for p in [
        (21.75, 0.48645112, -1.35),
        (15.75, 0.48645112, -1.75),
        (21.75, 2.48645112, -1.35),
        (15.75, 2.48645112, -1.75),
    ]]
    fillet(fillet_5_edges, radius=FILLET_5_R)


solid = part.part
